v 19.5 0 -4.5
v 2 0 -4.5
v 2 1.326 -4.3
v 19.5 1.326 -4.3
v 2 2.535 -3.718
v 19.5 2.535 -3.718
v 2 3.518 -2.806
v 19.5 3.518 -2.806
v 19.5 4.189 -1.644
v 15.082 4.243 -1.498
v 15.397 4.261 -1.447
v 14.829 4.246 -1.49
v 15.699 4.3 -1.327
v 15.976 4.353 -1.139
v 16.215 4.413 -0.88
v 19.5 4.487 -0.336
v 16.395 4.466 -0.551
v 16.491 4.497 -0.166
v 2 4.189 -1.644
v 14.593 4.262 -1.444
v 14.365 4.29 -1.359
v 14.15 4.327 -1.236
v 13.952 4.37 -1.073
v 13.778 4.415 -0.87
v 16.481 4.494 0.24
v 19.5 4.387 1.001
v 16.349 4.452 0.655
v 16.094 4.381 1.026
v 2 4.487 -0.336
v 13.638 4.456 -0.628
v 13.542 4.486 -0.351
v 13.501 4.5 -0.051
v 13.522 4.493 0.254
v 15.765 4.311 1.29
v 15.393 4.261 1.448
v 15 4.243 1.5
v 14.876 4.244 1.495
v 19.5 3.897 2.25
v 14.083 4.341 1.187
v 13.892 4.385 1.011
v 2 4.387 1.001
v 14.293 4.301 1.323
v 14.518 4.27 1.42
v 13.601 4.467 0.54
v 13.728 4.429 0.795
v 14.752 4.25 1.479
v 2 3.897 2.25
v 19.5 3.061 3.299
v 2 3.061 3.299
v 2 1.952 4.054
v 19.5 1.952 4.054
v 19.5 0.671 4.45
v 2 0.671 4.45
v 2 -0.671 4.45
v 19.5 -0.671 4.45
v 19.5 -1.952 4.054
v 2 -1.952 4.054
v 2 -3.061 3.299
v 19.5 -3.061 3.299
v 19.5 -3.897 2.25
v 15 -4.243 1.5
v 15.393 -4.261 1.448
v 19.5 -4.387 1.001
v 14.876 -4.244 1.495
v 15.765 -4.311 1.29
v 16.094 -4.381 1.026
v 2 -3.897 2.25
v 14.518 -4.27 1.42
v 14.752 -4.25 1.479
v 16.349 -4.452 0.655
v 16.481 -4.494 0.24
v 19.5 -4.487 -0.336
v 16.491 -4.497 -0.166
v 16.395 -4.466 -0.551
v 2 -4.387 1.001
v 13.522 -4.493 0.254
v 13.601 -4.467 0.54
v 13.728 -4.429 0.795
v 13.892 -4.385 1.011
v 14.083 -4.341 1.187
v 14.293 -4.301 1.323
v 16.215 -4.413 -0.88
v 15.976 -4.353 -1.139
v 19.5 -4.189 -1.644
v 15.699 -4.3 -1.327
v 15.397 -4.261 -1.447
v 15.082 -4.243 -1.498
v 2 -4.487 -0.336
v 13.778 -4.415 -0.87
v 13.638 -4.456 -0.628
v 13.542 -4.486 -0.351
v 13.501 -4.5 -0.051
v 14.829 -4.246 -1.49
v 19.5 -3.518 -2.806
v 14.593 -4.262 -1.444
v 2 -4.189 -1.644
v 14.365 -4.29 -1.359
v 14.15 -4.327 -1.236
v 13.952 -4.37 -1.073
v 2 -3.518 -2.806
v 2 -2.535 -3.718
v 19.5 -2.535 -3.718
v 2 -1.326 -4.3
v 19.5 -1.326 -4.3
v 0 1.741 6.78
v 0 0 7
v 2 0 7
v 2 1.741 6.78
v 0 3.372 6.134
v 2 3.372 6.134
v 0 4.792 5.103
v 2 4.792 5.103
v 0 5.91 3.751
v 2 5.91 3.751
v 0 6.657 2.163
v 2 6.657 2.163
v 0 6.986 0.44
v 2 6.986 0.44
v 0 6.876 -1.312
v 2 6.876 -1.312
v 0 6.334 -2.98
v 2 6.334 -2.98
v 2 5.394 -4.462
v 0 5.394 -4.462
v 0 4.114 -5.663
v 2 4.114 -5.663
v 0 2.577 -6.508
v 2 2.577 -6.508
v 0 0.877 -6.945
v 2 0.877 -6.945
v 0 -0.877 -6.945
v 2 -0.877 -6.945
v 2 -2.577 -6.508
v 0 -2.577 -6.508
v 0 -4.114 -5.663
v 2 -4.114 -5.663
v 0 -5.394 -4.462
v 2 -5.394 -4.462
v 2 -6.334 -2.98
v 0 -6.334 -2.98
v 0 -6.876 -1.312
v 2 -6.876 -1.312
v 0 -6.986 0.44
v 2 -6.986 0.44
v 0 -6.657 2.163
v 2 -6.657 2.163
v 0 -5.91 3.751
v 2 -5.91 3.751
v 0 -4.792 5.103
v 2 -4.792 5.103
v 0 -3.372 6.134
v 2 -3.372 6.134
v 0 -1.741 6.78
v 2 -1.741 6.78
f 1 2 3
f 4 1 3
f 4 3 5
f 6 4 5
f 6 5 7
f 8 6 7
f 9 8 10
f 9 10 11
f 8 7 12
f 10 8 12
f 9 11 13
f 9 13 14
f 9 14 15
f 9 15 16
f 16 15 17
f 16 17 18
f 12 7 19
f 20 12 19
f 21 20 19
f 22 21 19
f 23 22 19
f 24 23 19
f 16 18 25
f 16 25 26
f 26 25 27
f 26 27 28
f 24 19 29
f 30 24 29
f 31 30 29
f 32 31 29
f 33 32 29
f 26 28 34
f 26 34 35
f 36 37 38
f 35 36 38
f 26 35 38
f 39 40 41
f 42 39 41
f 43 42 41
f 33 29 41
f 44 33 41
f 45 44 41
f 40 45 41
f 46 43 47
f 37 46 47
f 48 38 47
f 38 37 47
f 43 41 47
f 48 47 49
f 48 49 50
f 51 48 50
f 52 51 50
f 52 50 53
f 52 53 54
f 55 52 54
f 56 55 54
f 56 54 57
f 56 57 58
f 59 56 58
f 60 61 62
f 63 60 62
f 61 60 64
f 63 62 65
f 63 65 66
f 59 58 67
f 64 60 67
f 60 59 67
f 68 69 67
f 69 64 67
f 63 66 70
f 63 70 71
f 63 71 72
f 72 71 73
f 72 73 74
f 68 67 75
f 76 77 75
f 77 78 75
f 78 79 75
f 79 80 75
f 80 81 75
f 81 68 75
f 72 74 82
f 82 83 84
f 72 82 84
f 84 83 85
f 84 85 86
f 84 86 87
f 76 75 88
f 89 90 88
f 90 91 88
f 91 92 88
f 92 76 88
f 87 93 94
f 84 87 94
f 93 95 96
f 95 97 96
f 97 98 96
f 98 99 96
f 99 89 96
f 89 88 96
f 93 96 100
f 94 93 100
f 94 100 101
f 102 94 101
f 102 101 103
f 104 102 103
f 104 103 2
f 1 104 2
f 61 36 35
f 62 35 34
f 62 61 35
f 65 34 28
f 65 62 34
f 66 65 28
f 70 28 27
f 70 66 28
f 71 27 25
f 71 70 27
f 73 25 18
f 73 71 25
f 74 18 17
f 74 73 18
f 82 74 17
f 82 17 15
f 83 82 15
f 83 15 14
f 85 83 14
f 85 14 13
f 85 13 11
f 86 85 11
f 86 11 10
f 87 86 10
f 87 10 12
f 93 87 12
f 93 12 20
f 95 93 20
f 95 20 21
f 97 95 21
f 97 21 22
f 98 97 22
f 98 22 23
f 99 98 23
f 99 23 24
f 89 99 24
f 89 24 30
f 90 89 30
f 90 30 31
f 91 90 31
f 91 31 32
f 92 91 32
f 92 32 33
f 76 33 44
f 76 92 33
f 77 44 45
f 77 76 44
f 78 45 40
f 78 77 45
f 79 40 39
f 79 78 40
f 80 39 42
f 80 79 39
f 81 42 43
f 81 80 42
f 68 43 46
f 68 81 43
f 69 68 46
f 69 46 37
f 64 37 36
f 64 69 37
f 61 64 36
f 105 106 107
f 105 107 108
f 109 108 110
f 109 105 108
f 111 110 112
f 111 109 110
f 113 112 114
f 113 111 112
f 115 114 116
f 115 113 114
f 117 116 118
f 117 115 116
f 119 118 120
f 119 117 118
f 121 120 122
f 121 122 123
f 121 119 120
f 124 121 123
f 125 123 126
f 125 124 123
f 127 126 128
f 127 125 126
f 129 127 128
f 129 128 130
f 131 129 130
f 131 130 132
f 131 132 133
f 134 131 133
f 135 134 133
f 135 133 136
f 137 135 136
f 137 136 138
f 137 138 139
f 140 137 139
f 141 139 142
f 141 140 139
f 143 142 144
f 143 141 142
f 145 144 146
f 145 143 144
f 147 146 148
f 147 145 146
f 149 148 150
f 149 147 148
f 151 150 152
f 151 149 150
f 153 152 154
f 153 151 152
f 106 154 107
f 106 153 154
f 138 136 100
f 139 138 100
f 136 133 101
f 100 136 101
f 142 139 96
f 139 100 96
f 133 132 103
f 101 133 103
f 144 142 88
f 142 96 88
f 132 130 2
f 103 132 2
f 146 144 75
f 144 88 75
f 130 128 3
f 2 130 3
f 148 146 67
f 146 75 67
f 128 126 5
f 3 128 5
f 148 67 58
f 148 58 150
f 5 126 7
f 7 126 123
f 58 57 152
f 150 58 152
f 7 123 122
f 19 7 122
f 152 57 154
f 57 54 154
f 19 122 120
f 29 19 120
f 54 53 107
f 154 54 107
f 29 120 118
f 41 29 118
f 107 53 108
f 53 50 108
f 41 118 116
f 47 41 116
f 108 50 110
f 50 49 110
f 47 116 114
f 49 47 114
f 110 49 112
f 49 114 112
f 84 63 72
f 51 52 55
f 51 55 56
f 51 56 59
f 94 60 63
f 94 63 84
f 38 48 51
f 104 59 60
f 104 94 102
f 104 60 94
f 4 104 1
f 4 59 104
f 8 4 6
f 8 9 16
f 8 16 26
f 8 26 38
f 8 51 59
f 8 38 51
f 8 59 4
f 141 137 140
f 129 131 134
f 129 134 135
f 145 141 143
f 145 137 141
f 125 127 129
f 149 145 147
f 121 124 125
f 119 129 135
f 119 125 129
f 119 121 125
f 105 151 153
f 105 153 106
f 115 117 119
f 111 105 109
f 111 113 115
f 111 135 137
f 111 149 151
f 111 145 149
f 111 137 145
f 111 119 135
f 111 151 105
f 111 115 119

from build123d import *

# Parameters (mm, degrees)
SKETCH1_R               = 4.5
BOSS_EXTRUDE1_DEPTH     = 19.5
SKETCH2_R               = 7
BOSS_EXTRUDE2_DEPTH     = 2
CUT_EXTRUDE1_DEPTH      = 22.868927729
CUT_EXTRUDE1_DEPTH_BACK = 22.868927729
SKETCH3_R               = 1.5


with BuildPart() as part:
    # Sketch1 → Boss-Extrude1 (new body)
    with BuildSketch(Plane(origin=(0, 0, 0), x_dir=(0, 0, -1), z_dir=(1, 0, 0))):
        Circle(SKETCH1_R)
    extrude(amount=BOSS_EXTRUDE1_DEPTH)

    # Sketch2 → Boss-Extrude2 (add)
    with BuildSketch(Plane.ZY):
        Circle(SKETCH2_R)
    extrude(amount=-BOSS_EXTRUDE2_DEPTH)

    # Sketch3 → Cut-Extrude1 (cut, two sides: drawn at the far end of the back side and taken through both)
    with BuildSketch(Plane(origin=(0, 0, 0), x_dir=(1, 0, 0), z_dir=(0, 1, 0)).offset(-CUT_EXTRUDE1_DEPTH_BACK)):
        with Locations(Location((15, 0, 0), (0, 0, 270))):
            Circle(SKETCH3_R)
    extrude(amount=CUT_EXTRUDE1_DEPTH + CUT_EXTRUDE1_DEPTH_BACK, mode=Mode.SUBTRACT)


solid = part.part
